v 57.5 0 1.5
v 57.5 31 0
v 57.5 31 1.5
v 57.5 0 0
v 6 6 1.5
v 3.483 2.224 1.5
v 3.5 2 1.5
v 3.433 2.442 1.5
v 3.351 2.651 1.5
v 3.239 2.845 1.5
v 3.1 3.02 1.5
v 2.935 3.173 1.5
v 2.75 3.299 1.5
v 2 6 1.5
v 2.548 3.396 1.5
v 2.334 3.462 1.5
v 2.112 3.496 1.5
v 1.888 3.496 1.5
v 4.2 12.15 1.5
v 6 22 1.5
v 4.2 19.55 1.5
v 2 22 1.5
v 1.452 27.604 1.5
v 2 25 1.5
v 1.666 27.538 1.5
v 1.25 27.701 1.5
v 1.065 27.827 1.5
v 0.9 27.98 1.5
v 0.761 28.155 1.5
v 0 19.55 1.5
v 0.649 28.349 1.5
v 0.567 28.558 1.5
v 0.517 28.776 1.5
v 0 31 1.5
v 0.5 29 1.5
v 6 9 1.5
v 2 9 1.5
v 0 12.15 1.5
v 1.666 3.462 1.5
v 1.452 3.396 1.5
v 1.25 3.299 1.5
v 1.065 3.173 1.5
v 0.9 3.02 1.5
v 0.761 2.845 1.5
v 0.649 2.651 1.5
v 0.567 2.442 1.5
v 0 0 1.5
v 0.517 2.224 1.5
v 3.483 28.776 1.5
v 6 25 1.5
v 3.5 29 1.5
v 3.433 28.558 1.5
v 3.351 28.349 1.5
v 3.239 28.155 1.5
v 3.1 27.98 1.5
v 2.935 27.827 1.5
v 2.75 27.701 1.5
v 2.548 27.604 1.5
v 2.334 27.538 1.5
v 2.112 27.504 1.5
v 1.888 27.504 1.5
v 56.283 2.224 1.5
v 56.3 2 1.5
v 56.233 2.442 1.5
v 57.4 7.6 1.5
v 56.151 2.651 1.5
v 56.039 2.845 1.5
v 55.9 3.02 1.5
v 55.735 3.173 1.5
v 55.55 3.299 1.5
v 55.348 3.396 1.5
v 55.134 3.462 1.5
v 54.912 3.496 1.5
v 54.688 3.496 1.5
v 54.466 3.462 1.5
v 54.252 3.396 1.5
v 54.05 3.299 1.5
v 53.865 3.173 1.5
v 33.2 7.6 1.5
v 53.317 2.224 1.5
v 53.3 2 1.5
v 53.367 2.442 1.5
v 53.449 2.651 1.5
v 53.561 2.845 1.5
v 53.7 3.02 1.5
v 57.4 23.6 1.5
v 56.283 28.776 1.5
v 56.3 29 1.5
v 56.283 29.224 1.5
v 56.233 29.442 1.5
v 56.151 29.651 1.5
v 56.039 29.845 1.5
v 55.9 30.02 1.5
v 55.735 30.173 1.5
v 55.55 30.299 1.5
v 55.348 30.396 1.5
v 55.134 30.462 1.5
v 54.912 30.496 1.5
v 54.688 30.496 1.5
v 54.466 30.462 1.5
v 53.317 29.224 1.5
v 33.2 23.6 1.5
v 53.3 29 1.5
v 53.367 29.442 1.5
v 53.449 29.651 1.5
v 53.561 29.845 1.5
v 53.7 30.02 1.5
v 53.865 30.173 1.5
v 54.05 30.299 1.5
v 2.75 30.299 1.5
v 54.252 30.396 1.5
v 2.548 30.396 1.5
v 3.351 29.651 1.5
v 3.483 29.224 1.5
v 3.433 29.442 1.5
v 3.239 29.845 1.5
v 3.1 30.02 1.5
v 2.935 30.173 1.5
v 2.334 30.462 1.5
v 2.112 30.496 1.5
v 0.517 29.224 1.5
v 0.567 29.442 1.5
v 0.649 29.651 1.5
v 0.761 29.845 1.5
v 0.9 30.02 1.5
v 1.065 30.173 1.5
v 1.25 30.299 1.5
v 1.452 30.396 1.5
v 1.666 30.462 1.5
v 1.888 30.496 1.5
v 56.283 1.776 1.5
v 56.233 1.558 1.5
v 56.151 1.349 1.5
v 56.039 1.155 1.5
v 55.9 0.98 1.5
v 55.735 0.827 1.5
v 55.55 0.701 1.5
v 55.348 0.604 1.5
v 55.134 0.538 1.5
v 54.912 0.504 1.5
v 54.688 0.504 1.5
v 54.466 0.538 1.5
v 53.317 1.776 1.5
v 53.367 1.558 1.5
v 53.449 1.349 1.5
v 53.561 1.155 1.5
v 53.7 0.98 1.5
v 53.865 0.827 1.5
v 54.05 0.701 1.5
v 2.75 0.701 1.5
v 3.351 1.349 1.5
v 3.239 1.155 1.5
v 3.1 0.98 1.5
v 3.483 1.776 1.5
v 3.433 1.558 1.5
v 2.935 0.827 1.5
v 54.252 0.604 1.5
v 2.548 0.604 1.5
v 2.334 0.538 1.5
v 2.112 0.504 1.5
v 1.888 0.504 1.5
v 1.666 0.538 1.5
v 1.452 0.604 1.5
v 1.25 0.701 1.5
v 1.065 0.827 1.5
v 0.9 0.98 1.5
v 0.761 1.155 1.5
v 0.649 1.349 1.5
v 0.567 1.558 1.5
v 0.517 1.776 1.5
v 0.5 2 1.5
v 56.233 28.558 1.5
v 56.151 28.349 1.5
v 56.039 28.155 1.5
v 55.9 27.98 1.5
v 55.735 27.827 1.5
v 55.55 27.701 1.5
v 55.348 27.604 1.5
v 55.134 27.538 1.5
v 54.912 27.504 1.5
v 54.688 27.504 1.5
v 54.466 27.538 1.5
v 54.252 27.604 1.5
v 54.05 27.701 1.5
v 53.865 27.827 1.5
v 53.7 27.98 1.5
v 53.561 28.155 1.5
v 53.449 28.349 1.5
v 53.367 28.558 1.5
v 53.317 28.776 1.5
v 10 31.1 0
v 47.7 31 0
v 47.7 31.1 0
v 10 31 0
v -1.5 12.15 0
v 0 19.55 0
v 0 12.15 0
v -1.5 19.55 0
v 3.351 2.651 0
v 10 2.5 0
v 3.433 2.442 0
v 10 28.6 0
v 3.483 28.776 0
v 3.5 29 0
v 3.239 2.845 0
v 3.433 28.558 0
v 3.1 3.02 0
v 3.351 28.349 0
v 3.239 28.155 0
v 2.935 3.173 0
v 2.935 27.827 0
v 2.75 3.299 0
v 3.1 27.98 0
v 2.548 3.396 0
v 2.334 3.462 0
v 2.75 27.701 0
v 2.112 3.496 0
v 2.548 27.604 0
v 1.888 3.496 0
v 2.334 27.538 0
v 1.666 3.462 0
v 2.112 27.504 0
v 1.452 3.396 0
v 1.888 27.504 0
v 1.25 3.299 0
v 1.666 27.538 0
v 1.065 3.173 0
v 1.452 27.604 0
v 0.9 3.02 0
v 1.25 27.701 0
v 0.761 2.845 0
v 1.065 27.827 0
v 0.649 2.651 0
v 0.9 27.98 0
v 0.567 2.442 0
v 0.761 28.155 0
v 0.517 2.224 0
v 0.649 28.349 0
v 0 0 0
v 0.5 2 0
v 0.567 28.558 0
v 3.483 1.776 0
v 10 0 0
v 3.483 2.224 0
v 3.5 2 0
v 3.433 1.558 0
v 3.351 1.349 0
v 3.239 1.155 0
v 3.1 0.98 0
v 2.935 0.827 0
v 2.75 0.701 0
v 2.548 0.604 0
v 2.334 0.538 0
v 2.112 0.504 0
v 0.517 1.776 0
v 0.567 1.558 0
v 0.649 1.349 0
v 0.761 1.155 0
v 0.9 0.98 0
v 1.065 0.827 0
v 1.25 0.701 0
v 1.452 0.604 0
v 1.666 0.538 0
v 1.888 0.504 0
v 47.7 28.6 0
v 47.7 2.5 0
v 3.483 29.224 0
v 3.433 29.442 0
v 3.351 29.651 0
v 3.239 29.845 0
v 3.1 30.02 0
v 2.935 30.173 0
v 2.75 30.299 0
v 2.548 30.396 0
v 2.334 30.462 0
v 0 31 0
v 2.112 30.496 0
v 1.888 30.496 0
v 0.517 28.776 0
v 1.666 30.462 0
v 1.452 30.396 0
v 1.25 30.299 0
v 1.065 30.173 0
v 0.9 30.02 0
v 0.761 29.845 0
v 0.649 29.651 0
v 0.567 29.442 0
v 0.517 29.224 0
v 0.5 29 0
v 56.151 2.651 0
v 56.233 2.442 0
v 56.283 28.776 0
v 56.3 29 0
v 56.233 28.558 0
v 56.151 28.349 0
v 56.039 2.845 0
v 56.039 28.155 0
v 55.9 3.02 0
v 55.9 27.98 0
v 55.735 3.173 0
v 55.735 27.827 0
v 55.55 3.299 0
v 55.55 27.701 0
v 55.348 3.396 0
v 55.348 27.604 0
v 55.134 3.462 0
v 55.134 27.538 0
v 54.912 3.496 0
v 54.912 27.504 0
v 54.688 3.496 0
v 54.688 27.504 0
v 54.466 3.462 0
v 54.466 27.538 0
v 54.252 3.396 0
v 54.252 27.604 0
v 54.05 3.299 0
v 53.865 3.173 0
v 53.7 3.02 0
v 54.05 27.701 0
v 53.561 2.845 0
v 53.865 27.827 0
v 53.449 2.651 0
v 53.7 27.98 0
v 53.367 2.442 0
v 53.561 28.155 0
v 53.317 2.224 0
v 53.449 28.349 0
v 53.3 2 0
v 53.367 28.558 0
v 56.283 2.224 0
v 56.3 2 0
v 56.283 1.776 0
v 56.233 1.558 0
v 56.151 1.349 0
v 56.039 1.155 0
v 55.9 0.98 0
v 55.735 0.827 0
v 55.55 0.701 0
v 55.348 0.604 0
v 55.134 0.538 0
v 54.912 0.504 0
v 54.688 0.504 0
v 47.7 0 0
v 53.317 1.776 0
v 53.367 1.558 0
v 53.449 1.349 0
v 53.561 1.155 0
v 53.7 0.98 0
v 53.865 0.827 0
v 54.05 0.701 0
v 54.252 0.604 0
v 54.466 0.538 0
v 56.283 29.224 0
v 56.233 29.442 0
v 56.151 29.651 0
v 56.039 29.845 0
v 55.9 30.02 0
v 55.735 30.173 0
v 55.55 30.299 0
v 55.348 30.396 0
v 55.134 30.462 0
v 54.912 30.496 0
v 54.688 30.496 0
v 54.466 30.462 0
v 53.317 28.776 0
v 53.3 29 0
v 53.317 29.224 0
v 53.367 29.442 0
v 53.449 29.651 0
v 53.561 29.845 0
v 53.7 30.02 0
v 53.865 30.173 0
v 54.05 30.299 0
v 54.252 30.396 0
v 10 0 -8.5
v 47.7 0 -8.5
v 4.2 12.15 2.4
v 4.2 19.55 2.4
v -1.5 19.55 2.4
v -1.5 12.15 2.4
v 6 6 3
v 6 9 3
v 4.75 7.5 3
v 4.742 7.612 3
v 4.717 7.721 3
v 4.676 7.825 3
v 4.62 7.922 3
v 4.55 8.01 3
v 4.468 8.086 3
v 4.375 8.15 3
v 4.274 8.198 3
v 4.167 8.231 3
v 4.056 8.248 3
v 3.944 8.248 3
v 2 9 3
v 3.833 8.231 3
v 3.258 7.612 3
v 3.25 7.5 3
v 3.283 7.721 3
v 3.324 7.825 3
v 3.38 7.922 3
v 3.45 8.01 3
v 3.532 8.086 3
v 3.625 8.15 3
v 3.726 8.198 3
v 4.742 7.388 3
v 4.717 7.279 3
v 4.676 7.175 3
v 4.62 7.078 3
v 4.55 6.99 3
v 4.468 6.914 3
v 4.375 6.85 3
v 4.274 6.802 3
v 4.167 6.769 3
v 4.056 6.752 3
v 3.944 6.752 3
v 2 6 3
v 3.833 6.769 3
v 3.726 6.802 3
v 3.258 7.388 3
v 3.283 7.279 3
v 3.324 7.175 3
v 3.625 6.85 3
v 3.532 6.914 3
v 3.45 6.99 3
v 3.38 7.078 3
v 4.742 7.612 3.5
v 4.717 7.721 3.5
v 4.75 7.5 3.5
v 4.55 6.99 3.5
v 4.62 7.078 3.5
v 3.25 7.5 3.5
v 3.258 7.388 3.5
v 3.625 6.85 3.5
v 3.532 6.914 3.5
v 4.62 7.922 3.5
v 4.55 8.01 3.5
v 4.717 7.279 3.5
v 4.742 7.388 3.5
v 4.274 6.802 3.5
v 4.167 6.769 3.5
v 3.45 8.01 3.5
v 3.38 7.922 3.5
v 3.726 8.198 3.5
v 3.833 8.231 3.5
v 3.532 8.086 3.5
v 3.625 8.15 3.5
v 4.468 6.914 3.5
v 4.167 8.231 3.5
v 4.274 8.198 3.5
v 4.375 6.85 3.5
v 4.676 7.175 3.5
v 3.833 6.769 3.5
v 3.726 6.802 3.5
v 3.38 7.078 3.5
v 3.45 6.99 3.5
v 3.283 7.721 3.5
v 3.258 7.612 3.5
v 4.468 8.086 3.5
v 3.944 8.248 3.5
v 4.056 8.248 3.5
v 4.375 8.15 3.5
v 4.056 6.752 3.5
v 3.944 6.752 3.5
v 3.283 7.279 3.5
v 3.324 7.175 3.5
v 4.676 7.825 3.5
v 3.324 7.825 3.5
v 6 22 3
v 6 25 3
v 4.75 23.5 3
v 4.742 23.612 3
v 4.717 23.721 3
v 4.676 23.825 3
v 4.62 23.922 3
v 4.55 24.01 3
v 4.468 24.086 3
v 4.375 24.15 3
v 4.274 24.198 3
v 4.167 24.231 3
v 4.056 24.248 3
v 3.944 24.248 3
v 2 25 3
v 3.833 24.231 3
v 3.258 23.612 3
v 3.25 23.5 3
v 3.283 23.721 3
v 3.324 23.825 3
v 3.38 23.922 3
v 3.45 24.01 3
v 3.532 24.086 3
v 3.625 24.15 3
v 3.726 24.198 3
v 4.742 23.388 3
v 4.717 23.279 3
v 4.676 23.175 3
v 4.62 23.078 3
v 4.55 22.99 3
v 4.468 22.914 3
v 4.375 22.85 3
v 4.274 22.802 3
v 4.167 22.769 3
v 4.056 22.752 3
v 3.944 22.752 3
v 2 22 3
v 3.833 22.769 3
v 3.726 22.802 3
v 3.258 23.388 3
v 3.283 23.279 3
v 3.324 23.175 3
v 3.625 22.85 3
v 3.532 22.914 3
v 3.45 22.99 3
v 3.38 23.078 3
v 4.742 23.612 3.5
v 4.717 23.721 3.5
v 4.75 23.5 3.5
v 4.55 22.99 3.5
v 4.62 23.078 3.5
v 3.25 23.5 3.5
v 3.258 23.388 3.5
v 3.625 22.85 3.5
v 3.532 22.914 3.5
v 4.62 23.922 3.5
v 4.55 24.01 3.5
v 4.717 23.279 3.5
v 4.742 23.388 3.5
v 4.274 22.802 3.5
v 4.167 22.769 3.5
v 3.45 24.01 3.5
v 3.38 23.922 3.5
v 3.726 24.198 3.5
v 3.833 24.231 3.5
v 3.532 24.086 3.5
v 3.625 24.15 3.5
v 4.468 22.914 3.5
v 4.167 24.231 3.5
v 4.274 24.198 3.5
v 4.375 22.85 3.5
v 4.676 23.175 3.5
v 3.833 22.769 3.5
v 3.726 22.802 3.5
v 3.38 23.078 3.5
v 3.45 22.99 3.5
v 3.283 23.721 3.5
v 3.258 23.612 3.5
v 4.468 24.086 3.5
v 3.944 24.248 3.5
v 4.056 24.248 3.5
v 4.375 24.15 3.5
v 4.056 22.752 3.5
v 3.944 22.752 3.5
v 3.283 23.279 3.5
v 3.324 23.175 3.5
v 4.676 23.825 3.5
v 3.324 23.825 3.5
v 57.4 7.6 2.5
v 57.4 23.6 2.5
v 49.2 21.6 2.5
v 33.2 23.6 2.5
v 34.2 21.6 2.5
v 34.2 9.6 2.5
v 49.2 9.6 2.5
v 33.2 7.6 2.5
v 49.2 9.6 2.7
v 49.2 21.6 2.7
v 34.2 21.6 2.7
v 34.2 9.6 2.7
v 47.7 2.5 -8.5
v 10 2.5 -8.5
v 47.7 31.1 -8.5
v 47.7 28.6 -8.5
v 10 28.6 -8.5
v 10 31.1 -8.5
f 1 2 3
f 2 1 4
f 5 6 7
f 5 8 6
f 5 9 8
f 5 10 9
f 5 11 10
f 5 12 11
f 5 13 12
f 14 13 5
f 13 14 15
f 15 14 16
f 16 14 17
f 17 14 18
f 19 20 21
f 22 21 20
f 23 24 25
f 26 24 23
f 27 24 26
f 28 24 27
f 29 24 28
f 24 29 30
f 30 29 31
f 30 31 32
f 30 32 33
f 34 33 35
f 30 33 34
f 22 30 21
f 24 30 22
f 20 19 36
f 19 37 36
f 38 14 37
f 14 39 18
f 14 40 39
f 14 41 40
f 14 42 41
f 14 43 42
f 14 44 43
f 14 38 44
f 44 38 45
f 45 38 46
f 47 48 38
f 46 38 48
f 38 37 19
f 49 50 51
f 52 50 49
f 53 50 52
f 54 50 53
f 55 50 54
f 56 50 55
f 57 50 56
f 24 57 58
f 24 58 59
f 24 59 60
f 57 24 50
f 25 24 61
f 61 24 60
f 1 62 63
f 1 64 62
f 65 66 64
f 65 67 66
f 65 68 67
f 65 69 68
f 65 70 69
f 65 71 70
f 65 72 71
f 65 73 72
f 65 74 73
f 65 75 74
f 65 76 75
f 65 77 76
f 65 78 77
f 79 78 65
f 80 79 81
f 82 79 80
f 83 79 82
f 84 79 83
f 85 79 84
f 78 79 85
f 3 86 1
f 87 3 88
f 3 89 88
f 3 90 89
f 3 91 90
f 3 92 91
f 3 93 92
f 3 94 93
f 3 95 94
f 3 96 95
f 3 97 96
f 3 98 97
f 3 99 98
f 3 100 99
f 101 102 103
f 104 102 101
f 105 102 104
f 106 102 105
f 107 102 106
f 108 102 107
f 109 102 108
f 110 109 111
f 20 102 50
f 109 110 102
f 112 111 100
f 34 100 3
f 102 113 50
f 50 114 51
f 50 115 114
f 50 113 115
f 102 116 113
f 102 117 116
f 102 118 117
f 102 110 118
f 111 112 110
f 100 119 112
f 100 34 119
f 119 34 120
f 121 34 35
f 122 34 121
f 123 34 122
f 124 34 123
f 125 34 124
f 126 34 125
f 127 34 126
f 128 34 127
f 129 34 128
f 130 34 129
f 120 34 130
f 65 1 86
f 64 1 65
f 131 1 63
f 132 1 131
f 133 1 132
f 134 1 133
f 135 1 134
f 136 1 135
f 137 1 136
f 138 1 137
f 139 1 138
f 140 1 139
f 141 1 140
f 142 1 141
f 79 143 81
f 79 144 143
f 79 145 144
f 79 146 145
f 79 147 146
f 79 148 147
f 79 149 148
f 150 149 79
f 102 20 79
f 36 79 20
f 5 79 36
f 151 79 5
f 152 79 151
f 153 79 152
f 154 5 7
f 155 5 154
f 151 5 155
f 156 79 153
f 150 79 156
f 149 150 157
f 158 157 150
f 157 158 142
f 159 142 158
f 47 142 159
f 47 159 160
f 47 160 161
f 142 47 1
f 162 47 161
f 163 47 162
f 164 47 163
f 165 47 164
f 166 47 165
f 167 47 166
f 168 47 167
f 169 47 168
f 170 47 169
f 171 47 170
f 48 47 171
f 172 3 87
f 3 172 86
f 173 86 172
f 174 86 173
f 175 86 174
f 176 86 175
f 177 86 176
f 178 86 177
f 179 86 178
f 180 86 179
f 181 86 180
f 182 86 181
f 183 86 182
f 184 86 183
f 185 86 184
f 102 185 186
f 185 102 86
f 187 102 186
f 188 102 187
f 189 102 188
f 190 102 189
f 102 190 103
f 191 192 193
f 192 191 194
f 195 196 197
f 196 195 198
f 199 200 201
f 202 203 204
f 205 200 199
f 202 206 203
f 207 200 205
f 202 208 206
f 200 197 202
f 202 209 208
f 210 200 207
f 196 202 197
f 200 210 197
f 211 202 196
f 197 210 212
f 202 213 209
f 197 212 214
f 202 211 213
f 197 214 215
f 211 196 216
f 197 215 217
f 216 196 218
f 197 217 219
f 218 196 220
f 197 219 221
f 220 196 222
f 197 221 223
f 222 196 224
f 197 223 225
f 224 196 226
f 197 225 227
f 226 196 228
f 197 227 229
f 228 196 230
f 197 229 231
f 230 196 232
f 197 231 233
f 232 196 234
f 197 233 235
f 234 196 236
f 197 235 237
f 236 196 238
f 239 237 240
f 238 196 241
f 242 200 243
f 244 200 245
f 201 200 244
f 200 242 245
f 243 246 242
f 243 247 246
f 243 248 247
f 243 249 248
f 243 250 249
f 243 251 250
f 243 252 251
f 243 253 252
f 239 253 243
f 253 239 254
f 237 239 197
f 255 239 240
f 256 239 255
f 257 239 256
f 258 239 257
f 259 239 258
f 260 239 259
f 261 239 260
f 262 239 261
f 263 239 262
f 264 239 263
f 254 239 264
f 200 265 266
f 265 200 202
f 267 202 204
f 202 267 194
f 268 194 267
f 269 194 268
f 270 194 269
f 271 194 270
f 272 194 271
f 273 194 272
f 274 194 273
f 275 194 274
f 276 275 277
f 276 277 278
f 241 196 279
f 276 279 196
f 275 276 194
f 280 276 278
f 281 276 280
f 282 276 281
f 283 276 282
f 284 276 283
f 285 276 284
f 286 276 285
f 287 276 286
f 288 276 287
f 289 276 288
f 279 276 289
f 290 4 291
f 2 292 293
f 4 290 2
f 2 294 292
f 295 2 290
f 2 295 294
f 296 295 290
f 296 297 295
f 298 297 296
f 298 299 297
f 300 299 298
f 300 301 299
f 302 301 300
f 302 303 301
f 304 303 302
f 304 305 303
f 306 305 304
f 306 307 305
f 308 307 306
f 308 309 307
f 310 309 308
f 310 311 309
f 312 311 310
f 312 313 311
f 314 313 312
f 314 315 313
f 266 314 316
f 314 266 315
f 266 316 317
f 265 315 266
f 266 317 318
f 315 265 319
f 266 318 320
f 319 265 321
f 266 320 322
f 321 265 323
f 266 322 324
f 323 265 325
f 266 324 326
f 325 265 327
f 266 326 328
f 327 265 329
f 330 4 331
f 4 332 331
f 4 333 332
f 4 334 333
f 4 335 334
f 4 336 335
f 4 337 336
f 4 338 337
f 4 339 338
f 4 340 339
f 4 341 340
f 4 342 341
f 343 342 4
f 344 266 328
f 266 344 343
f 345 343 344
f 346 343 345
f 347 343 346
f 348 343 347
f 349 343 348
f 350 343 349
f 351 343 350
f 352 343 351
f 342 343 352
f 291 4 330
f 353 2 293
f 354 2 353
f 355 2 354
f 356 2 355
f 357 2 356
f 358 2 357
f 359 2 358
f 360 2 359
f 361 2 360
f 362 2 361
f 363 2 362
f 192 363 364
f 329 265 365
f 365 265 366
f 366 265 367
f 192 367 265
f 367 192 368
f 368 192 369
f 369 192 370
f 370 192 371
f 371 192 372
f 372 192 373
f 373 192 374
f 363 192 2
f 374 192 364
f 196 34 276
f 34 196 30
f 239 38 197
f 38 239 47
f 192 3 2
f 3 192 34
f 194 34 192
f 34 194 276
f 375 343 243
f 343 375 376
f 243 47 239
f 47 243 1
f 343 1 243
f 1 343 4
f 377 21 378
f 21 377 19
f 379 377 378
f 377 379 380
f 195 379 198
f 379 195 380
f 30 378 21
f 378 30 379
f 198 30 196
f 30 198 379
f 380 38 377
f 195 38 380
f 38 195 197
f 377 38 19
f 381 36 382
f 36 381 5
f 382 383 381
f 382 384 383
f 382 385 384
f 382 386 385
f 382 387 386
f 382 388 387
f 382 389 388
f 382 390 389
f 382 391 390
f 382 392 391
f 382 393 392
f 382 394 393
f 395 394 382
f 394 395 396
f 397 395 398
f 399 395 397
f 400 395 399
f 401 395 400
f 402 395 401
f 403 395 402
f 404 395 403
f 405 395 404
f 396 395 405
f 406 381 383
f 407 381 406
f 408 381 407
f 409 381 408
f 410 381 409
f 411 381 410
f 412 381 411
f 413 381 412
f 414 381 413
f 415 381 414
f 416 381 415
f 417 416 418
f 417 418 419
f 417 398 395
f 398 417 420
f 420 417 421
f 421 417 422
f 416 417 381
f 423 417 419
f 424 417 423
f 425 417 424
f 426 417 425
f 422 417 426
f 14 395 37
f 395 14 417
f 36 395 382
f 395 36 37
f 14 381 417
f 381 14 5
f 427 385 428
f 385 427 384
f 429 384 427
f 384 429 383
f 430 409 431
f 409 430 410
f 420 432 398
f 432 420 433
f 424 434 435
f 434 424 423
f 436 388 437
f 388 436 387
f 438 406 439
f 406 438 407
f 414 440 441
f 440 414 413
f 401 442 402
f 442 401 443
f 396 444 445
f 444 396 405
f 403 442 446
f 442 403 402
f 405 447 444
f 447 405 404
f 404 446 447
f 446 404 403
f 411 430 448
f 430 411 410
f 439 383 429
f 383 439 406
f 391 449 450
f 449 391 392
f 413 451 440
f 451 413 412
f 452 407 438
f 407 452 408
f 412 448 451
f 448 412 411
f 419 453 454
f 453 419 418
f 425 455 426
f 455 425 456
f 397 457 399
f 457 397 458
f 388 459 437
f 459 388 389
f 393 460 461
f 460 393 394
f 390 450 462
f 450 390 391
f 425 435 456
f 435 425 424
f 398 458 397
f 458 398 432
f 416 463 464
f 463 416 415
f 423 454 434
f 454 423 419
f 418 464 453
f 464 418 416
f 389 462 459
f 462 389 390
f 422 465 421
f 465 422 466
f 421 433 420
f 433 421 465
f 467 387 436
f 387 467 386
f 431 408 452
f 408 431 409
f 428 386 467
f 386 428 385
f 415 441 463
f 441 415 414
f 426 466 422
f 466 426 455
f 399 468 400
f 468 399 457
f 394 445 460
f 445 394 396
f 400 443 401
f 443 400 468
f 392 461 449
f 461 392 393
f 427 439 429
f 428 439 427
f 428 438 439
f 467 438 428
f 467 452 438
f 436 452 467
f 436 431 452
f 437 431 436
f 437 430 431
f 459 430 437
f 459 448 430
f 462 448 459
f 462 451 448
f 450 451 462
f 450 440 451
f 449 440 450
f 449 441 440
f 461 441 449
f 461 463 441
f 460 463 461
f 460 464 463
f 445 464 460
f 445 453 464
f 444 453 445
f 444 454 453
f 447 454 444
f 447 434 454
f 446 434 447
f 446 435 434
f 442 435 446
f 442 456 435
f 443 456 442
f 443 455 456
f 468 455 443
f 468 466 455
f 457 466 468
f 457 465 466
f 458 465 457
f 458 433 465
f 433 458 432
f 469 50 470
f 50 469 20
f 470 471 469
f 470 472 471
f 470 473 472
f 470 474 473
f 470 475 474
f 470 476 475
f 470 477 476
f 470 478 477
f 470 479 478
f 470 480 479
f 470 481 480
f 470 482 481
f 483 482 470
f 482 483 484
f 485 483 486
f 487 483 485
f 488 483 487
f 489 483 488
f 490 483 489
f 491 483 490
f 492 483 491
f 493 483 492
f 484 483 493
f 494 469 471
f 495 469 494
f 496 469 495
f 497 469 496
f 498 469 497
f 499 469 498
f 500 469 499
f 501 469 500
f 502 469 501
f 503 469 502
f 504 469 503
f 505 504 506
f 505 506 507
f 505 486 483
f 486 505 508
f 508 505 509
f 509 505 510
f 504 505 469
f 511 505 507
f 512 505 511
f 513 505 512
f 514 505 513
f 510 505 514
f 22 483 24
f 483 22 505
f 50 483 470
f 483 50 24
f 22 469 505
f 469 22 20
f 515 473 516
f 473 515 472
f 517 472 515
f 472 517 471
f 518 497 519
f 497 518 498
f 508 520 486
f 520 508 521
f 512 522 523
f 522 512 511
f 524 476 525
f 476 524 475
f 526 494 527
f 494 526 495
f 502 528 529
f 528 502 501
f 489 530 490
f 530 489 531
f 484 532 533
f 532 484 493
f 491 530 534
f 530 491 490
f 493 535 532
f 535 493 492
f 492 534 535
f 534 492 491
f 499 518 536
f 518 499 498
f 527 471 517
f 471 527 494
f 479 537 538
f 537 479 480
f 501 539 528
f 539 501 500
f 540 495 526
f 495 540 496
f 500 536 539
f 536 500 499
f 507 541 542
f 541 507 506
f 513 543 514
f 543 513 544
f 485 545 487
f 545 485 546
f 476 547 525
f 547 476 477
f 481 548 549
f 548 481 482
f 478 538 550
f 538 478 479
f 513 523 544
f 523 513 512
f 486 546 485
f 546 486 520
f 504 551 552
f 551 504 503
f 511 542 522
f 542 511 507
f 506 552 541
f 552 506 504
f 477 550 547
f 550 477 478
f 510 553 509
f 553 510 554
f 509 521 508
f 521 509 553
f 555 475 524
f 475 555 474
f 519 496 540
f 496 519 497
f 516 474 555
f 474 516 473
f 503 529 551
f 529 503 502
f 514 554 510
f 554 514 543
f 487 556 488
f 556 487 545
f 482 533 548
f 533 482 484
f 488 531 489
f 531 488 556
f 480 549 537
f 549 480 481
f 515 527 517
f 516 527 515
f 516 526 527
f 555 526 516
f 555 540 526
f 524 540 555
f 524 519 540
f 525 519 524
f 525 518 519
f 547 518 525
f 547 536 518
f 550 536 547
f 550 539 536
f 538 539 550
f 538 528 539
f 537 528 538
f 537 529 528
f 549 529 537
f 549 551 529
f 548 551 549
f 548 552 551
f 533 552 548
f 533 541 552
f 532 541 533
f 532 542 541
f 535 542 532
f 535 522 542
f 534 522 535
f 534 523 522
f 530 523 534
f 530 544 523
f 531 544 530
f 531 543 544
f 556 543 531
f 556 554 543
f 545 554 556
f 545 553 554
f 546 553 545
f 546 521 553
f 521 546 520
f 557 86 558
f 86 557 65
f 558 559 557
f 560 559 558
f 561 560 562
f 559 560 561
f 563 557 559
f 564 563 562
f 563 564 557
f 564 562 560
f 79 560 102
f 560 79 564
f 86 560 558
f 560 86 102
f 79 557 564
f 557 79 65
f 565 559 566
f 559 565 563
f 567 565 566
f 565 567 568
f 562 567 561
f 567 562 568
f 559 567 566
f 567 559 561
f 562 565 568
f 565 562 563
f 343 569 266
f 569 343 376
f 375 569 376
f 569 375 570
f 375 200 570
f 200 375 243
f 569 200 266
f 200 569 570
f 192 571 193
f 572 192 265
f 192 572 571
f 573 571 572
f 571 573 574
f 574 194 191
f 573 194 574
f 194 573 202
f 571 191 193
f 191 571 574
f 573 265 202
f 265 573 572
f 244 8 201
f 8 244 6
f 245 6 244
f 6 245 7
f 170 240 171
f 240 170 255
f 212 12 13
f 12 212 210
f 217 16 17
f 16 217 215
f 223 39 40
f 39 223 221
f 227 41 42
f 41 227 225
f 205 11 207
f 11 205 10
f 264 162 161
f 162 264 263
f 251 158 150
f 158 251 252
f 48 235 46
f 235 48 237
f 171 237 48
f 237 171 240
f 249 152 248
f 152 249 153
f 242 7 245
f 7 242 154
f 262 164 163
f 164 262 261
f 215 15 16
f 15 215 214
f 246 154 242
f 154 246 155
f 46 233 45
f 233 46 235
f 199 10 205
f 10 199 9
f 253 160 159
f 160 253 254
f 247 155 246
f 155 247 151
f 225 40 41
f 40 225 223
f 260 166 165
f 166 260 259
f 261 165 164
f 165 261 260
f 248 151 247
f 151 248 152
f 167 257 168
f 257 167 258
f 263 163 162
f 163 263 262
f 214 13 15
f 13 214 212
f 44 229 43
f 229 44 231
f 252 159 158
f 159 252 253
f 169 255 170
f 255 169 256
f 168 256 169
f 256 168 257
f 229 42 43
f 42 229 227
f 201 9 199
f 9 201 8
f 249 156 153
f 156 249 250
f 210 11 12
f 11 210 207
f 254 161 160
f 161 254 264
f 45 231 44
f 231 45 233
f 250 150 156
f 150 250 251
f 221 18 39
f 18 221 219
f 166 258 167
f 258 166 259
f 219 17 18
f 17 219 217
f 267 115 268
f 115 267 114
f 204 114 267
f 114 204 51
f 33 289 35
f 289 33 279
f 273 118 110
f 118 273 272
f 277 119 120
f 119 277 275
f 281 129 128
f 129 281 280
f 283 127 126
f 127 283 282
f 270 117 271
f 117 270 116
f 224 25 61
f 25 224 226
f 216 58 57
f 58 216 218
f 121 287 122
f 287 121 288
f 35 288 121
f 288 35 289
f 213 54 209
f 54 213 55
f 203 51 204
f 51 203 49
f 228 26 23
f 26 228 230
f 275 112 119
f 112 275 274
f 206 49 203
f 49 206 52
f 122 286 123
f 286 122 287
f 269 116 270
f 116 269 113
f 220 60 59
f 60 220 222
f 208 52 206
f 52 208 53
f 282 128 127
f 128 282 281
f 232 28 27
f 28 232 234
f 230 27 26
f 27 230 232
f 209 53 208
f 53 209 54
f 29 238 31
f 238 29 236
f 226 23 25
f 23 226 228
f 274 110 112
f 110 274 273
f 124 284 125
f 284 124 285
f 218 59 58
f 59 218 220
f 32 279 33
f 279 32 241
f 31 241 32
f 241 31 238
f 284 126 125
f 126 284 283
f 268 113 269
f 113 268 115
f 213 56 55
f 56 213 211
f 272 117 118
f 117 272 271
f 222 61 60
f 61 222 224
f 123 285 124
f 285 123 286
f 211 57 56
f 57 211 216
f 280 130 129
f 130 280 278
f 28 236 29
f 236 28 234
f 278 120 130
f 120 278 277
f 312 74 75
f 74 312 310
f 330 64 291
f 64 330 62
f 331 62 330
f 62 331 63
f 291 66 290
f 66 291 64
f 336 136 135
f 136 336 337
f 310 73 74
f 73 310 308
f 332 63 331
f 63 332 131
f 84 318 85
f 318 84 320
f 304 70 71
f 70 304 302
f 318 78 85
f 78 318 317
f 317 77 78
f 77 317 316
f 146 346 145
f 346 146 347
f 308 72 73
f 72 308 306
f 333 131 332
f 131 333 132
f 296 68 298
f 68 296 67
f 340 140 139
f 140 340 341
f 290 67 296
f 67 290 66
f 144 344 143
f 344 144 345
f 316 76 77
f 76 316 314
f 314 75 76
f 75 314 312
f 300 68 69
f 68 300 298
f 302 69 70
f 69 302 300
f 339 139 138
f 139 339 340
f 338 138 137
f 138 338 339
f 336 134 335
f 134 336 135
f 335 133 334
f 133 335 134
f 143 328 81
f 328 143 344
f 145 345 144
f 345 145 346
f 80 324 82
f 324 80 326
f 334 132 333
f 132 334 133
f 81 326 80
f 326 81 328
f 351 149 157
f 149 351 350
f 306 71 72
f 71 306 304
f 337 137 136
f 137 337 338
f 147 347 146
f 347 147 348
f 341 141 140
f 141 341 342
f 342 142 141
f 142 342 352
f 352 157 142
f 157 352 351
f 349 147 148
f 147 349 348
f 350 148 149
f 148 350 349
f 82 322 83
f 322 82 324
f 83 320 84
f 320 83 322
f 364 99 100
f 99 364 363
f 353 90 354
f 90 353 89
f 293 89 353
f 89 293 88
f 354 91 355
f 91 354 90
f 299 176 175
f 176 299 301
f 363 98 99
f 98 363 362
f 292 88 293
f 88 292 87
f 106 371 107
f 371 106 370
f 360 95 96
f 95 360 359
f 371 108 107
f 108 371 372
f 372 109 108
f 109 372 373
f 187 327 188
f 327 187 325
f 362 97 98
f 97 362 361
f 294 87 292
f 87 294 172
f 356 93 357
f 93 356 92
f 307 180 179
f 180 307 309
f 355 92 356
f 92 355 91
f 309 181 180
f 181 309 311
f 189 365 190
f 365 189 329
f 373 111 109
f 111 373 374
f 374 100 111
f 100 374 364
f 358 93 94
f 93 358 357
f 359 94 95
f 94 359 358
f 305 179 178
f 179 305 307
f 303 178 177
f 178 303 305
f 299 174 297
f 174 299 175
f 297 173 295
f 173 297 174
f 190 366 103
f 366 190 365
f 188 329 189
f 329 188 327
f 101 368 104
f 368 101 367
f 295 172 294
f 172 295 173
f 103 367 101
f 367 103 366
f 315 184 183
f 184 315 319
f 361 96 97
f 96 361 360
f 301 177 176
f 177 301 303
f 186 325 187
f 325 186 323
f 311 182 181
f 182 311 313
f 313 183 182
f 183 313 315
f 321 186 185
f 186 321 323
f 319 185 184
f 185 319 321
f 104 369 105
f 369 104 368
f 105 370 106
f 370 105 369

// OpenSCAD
$fn = 42;

difference(){
	union() {
		union() {
			union() {
				union() {
					union() {
						union() {
							union() {
								union() {
									union() {
										union() {
											cube(size = [57.5000000000, 31, 1.5000000000]);
											translate(v = [2, 0, 0]) {
												translate(v = [0, 2, 0]) {
												}
											}
										}
										translate(v = [2, 0, 0]) {
											translate(v = [0, 29, 0]) {
											}
										}
									}
									translate(v = [54.8000000000, 0, 0]) {
										translate(v = [0, 2, 0]) {
										}
									}
								}
								translate(v = [54.8000000000, 0, 0]) {
									translate(v = [0, 29, 0]) {
									}
								}
							}
							translate(v = [0, 12.1500000000, 0]) {
								translate(v = [-1.5000000000, 0, 0]) {
									cube(size = [5.7000000000, 7.4000000000, 2.4000000000]);
								}
							}
						}
						translate(v = [0, 6, 0]) {
							translate(v = [2, 0, 0]) {
								union() {
									translate(v = [0, 0, 1.5000000000]) {
										cube(size = [4, 3, 1.5000000000]);
									}
									translate(v = [0, 0, 2.5000000000]) {
										translate(v = [2, 0, 0]) {
											translate(v = [0, 1.5000000000, 0]) {
												cylinder(d = 1.5000000000, h = 1);
											}
										}
									}
								}
							}
						}
					}
					translate(v = [0, 22, 0]) {
						translate(v = [2, 0, 0]) {
							union() {
								translate(v = [0, 0, 1.5000000000]) {
									cube(size = [4, 3, 1.5000000000]);
								}
								translate(v = [0, 0, 2.5000000000]) {
									translate(v = [2, 0, 0]) {
										translate(v = [0, 1.5000000000, 0]) {
											cylinder(d = 1.5000000000, h = 1);
										}
									}
								}
							}
						}
					}
				}
				translate(v = [0, 7.6000000000, 0]) {
					translate(v = [33.2000000000, 0, 0]) {
						translate(v = [0, 0, 1.5000000000]) {
							union() {
								cube(size = [24.2000000000, 16, 1]);
								translate(v = [0, 2, 0]) {
									translate(v = [1, 0, 0]) {
										cube(size = [15, 12, 1.2000000000]);
									}
								}
							}
						}
					}
				}
			}
			translate(v = [0, 0, -8.5000000000]) {
				translate(v = [10, 0, 0]) {
					cube(size = [37.7000000000, 2.5000000000, 8.5000000000]);
				}
			}
		}
		translate(v = [0, 0, -8.5000000000]) {
			translate(v = [10, 0, 0]) {
				translate(v = [0, 28.6000000000, 0]) {
					cube(size = [37.7000000000, 2.5000000000, 8.5000000000]);
				}
			}
		}
	}
	/* Holes Below*/
	union(){
		union(){
			union(){
				union(){
					union(){
						union(){
							union(){
								union(){
									union(){
										union(){
											translate(v = [2, 0, 0]){
												translate(v = [0, 2, 0]){
													translate(v = [0, 0, -20]) {
														cylinder(d = 3, h = 100);
													}
												}
											}
										}
										translate(v = [2, 0, 0]){
											translate(v = [0, 29, 0]){
												translate(v = [0, 0, -20]) {
													cylinder(d = 3, h = 100);
												}
											}
										}
									}
									translate(v = [54.8000000000, 0, 0]){
										translate(v = [0, 2, 0]){
											translate(v = [0, 0, -20]) {
												cylinder(d = 3, h = 100);
											}
										}
									}
								}
								translate(v = [54.8000000000, 0, 0]){
									translate(v = [0, 29, 0]){
										translate(v = [0, 0, -20]) {
											cylinder(d = 3, h = 100);
										}
									}
								}
							}
						}
					}
				}
			}
		}
	} /* End Holes */ 
}
/***********************************************
*********      SolidPython code:      **********
************************************************
 
from os.path import join
from solid.utils import *

SEGMENTS = 42
HAS_PINS = True


def assemble():
    print "assembling"
    base = cube([57.5, 31, 1.5])

    print "punching holes"
    _hole_cylinder = hole()(down(20)(cylinder(d=3, h=100)))
    base += right(2)(forward(2)(_hole_cylinder))
    base += right(2)(forward(29)(_hole_cylinder))
    base += right(54.8)(forward(2)(_hole_cylinder))
    base += right(54.8)(forward(29)(_hole_cylinder))

    print "attaching usb port"
    _cube_port = cube([5.7, 7.4, 2.4])
    base += forward(31/2-5.7/2)(left(1.5)(_cube_port))

    print "attaching buttons"
    _cube_btn = up(1.5)(cube([4, 3, 1.5]))
    _cube_btn += up(2.5)(right(2)(forward(1.5)(cylinder(d=1.5, h=1))))
    base += forward(6)(right(2)(_cube_btn))
    base += forward(22)(right(2)(_cube_btn))

    print "attaching main chip"
    _cube_chip = cube([24.2, 16, 1])
    _cube_chip += forward(2)(right(1)(cube([15, 12, 1.2])))
    base += forward(7.6)(right(33.2)(up(1.5)(_cube_chip)))

    if HAS_PINS:
        print "attaching pins"
        pin_base = cube([37.7, 2.5, 8.5])
        # todo pins
        base += down(8.5)(right(10)(pin_base))
        base += down(8.5)(right(10)(forward(28.6)(pin_base)))

    print "done"
    return base


if __name__ == '__main__':
    scad_render_to_file(assemble(), join('./out/', "esp8266.scad"), file_header='$fn = %s;' % SEGMENTS)
 
 
************************************************/
